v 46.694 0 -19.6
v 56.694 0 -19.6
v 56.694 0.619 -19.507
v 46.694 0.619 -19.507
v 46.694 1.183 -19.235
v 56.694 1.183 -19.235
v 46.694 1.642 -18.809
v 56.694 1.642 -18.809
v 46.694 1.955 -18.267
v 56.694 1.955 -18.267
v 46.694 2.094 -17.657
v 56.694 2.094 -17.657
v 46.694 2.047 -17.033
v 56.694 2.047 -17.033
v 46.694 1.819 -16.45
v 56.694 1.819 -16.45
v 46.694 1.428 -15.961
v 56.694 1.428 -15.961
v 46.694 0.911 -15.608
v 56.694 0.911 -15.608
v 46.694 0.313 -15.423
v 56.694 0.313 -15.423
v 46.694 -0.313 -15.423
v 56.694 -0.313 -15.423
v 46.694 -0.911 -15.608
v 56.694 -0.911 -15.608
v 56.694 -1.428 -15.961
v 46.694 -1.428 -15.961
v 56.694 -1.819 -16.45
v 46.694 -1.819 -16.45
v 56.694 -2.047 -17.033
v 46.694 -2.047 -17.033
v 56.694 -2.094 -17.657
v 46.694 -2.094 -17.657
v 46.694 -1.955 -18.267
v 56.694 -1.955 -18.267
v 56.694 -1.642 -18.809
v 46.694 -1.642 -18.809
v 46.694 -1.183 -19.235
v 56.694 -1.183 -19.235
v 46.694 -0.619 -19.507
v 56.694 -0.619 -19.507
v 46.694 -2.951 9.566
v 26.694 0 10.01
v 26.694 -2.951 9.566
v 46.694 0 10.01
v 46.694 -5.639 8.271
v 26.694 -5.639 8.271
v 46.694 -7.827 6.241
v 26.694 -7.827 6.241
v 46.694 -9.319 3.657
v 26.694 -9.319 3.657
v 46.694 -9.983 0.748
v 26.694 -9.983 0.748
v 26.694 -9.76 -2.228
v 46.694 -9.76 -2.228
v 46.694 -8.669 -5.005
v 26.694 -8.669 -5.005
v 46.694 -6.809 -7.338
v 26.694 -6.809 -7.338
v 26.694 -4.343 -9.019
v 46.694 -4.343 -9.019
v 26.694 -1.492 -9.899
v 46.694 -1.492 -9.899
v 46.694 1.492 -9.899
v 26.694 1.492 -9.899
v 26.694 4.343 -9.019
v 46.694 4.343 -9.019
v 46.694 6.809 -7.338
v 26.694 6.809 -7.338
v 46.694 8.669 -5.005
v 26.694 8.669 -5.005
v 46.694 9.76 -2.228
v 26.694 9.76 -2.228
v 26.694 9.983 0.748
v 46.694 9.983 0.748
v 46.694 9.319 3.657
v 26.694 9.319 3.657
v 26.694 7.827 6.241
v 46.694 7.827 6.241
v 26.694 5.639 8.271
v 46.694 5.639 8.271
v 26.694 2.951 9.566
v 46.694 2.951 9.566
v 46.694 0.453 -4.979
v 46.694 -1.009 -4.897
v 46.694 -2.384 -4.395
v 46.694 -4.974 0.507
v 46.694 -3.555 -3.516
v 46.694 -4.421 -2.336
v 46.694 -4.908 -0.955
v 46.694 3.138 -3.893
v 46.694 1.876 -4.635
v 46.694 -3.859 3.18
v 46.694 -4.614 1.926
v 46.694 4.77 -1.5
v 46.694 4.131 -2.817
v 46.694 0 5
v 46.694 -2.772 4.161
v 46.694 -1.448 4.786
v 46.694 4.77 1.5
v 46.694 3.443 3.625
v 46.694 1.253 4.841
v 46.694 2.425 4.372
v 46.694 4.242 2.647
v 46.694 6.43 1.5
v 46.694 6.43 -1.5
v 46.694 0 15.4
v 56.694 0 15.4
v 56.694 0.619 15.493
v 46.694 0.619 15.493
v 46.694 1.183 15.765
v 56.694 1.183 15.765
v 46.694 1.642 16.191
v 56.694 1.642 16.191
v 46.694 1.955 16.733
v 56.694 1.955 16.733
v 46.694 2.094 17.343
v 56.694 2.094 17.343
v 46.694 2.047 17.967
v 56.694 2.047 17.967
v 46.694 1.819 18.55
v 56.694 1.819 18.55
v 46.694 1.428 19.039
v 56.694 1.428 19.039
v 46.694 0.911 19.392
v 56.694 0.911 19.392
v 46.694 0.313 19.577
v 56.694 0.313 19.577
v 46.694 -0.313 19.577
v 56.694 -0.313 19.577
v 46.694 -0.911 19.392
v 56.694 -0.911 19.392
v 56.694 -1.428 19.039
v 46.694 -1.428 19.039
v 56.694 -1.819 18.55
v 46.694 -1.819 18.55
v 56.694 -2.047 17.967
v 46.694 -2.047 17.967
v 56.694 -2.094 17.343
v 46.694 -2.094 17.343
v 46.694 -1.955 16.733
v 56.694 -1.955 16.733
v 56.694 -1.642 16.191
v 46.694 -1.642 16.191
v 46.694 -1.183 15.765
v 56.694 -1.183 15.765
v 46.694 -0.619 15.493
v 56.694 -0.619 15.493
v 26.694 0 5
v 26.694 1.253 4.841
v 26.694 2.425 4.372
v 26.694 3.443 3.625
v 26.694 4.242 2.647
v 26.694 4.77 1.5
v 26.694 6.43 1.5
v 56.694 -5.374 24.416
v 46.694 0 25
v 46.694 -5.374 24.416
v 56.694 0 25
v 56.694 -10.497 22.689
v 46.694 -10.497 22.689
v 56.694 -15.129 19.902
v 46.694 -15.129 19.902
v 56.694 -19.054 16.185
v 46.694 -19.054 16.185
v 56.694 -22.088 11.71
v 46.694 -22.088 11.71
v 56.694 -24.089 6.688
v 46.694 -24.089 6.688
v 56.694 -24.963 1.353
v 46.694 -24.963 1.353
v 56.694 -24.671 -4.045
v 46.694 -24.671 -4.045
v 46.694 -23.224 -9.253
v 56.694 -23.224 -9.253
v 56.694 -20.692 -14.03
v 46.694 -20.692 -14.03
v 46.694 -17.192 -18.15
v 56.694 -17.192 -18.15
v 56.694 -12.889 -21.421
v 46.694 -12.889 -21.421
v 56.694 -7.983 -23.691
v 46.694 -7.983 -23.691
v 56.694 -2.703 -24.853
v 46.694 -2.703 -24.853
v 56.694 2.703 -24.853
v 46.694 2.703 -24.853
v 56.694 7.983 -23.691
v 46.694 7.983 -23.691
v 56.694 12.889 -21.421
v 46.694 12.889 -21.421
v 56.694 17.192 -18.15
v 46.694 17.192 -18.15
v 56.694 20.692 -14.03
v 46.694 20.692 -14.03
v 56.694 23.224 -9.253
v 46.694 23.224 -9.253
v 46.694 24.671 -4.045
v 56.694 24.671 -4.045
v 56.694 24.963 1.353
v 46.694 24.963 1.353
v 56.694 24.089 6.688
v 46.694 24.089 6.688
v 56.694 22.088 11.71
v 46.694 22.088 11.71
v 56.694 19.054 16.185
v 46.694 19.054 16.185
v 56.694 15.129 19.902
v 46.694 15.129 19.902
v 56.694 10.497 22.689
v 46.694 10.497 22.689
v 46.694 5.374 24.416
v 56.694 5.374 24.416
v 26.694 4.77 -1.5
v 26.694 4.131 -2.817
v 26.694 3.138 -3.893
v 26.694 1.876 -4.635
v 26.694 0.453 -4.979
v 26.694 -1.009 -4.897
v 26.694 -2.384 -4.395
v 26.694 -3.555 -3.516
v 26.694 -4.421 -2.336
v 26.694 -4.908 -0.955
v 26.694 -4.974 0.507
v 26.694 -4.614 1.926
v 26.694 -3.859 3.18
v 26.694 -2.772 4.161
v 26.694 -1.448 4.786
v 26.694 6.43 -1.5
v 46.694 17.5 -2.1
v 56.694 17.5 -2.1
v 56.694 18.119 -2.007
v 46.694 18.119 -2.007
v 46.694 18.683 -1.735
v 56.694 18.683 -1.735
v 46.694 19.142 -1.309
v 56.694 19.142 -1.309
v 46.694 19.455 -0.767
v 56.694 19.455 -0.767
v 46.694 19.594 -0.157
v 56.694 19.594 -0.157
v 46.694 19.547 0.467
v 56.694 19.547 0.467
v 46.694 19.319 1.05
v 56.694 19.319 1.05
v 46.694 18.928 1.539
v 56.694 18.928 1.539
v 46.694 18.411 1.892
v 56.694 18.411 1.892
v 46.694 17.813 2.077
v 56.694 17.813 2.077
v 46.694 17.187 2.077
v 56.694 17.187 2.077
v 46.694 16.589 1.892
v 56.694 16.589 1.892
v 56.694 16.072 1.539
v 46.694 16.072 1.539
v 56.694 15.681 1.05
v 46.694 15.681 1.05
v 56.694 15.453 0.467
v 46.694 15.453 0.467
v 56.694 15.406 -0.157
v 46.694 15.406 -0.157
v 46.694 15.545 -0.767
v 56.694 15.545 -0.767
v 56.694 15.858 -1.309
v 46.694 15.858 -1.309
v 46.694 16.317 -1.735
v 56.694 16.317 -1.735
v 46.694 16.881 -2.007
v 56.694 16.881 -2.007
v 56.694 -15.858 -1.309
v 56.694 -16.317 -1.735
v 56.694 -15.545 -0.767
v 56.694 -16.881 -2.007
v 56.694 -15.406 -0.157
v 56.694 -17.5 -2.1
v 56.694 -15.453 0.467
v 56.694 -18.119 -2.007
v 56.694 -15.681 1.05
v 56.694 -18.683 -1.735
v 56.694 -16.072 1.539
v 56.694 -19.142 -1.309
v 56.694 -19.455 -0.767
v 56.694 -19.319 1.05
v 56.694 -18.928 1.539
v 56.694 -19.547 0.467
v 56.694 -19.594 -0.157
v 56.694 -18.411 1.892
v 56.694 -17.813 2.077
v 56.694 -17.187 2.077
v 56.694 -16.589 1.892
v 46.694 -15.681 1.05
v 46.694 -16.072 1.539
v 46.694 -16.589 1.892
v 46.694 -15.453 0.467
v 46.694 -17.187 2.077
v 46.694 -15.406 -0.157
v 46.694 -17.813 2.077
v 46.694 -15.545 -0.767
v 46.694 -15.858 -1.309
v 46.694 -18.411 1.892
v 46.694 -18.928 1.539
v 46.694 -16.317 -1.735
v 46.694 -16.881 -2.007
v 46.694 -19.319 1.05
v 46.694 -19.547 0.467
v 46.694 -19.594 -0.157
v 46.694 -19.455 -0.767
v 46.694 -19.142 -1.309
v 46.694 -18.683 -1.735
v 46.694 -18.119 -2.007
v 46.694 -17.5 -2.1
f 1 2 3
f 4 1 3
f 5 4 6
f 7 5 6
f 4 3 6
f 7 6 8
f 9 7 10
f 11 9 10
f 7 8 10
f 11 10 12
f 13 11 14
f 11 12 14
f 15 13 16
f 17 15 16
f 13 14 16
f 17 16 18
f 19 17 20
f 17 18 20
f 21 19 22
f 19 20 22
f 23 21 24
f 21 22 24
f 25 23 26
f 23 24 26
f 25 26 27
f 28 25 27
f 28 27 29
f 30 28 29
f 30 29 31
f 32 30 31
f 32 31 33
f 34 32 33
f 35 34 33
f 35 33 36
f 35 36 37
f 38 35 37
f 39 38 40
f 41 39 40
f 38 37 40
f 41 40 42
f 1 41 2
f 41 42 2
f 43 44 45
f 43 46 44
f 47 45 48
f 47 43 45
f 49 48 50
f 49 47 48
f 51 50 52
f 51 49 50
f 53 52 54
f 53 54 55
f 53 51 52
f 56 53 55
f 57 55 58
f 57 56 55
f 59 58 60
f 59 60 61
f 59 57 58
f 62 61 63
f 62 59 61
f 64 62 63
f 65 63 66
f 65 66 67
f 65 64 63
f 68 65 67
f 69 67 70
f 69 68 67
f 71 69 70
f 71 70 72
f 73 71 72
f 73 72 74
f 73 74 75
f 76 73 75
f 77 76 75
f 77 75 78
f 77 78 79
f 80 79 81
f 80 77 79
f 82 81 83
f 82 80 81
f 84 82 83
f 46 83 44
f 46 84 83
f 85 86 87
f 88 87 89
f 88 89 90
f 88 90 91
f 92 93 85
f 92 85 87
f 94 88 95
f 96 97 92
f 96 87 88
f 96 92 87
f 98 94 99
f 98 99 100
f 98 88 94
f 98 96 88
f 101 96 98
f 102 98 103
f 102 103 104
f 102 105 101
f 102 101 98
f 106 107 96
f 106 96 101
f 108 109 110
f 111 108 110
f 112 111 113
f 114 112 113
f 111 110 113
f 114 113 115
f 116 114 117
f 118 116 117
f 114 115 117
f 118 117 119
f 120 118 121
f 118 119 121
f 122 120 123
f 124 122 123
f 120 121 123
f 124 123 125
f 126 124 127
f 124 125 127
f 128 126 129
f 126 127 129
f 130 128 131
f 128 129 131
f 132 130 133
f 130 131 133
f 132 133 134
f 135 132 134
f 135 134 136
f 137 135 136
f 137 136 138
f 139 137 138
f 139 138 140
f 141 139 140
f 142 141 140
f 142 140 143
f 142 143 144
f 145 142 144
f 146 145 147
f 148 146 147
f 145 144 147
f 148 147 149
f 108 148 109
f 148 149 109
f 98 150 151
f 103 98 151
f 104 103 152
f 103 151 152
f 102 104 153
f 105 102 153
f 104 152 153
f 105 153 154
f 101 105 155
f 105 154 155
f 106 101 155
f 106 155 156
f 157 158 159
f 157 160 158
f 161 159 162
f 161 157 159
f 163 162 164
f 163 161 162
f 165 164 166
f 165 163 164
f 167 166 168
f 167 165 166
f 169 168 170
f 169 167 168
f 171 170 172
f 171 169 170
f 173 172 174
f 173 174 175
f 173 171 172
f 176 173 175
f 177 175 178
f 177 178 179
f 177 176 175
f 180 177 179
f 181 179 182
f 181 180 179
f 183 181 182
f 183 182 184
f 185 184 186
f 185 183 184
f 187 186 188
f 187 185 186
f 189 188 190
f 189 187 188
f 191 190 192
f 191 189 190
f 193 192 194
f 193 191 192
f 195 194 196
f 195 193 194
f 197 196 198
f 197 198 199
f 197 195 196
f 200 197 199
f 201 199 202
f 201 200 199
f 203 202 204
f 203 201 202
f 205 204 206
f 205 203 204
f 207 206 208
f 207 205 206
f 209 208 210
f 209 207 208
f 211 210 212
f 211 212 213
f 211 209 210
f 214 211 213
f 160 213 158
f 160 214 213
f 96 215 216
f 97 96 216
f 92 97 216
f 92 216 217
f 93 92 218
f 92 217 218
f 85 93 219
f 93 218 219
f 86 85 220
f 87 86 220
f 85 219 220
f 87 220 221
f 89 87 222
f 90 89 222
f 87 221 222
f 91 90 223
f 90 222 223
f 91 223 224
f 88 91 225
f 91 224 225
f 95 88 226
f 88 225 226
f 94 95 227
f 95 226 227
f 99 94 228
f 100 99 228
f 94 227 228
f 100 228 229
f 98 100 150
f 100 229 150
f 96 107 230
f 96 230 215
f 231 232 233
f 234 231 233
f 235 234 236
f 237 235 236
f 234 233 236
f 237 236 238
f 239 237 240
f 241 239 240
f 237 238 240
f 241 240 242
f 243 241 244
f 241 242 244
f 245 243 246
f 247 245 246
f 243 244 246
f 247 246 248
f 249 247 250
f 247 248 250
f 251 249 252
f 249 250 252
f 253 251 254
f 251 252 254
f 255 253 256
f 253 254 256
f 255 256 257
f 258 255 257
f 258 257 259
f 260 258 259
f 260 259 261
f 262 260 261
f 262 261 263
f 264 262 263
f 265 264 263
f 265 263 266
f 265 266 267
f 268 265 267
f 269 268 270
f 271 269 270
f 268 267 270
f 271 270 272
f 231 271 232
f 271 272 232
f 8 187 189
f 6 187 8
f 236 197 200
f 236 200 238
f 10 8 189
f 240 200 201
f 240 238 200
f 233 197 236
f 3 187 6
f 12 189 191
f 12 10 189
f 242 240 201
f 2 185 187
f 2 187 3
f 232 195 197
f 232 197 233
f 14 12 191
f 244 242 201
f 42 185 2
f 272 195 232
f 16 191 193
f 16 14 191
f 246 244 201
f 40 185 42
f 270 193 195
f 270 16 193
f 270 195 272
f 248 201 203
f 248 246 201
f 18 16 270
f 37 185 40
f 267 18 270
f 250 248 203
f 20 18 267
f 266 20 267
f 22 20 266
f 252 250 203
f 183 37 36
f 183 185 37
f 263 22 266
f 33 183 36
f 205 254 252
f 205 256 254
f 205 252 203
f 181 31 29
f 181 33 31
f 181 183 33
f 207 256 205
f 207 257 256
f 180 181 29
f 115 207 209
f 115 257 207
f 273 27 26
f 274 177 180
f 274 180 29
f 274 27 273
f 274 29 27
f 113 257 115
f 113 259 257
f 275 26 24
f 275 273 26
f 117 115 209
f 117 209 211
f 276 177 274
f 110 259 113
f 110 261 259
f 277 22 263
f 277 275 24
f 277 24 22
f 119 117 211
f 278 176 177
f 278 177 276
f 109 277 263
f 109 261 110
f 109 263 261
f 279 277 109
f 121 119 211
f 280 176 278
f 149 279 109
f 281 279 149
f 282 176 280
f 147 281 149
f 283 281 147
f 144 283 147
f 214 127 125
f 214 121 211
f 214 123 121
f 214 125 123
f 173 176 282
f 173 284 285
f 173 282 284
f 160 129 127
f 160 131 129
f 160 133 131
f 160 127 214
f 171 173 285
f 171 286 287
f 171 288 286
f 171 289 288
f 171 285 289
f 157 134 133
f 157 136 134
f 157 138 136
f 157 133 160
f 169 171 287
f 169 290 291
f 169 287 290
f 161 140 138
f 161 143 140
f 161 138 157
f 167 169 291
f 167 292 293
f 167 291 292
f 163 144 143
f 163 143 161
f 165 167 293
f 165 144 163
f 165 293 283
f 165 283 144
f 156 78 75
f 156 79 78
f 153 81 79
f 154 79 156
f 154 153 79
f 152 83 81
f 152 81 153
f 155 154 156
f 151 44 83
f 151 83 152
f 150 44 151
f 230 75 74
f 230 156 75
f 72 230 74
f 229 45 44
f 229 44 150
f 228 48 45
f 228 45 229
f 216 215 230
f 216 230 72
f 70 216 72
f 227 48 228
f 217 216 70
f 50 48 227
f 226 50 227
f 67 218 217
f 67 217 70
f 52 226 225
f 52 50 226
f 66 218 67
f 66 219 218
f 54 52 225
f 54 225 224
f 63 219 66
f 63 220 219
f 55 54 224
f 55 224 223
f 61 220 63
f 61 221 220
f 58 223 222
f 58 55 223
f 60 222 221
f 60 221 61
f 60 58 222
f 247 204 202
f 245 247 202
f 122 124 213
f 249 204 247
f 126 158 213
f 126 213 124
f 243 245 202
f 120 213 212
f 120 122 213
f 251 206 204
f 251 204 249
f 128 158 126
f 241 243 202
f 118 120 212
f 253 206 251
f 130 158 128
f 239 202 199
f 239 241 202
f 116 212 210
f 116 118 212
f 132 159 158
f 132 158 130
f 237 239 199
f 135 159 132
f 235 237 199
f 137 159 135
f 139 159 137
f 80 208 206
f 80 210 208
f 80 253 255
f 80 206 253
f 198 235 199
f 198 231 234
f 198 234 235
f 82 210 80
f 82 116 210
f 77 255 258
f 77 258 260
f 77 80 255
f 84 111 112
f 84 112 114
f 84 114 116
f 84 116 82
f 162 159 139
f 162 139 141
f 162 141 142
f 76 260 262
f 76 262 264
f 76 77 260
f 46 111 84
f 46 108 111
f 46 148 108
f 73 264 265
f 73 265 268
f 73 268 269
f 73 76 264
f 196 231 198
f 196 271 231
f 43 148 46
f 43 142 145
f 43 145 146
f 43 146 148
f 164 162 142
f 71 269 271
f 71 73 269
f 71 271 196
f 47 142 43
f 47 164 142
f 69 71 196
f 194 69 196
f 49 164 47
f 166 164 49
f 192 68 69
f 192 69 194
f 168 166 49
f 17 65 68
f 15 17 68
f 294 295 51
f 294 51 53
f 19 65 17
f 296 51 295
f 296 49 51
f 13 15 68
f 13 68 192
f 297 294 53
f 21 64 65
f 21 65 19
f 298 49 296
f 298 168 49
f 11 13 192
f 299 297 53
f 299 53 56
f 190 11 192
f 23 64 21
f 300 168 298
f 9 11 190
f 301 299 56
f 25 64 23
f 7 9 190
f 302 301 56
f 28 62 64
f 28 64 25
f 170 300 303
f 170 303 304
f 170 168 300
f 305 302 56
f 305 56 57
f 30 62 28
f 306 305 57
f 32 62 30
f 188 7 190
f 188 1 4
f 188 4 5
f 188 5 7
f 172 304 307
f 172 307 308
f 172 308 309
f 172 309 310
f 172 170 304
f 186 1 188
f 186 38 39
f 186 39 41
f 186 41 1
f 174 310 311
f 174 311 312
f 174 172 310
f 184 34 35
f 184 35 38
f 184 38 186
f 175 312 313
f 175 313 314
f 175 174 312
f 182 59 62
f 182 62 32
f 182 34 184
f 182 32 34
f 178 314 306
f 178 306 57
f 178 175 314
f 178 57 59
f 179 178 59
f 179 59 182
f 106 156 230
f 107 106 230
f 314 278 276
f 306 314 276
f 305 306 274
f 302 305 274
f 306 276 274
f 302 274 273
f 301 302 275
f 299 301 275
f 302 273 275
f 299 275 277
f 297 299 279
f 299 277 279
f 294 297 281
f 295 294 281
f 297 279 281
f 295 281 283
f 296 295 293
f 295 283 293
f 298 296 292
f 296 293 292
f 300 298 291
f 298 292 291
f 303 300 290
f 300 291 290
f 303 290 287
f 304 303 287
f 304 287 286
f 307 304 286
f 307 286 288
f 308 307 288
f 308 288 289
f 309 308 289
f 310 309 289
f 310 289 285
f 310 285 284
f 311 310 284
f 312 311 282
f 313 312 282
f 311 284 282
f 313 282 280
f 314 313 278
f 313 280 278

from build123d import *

# Parameters (mm, degrees)
CUT_EXTRUDE1_DEPTH = 20
SKETCH3_R          = 2.1
CUT_EXTRUDE2_DEPTH = 10


with BuildPart() as part:
    # Sketch1 → Revolve1 (revolve)
    with BuildSketch(Plane(origin=(0, 0, 0), x_dir=(1, 0, 0), z_dir=(0, 1, 0)), mode=Mode.PRIVATE) as revolve1_sk:
        Polygon((26.693713361, 0), (26.693713361, 10.0105), (46.693713361, 10.0105), (46.693713361, 25), (56.693713361, 25), (56.693713361, 0), align=None)
    revolve(revolve1_sk.sketch.rotate(Axis((26.693713361, 0, 0), (1, 0, 0)), 180), axis=Axis((26.693713361, 0, 0), (1, 0, 0)))

    # Sketch2 → Cut-Extrude1 (cut)
    with BuildSketch(Plane.ZY.offset(-26.693713361)):
        with BuildLine():
            ThreePointArc((1.5, 4.769696007), (0, 5), (-1.5, 4.769696007))
            Line((-1.5, 4.769696007), (-1.5, 3.57))
            Line((-1.5, 3.57), (1.5, 3.57))
            Line((1.5, 3.57), (1.5, 4.769696007))
        make_face()
        with BuildLine():
            Line((-1.5, 3.57), (-1.5, 4.769696007))
            ThreePointArc((-1.5, 4.769696007), (-2.958039892, -4.031128874), (5, 0))
            ThreePointArc((5, 0), (4.031128874, 2.958039892), (1.5, 4.769696007))
            Line((1.5, 4.769696007), (1.5, 3.57))
            Line((1.5, 3.57), (-1.5, 3.57))
        make_face()
        with BuildLine():
            Line((1.5, 6.43), (-1.5, 6.43))
            Line((-1.5, 6.43), (-1.5, 4.769696007))
            ThreePointArc((-1.5, 4.769696007), (0, 5), (1.5, 4.769696007))
            Line((1.5, 4.769696007), (1.5, 6.43))
        make_face()
    extrude(amount=-CUT_EXTRUDE1_DEPTH, mode=Mode.SUBTRACT)

    # Sketch3 → Cut-Extrude2 (cut)
    with BuildSketch(Plane(origin=(56.693713361, 0, 0), x_dir=(0, 0, -1), z_dir=(1, 0, 0))):
        with Locations((0, 17.5)):
            Circle(SKETCH3_R)
        with Locations((17.5, 0)):
            Circle(SKETCH3_R)
        with Locations((0, -17.5)):
            Circle(SKETCH3_R)
        with Locations((-17.5, 0)):
            Circle(SKETCH3_R)
    extrude(amount=-CUT_EXTRUDE2_DEPTH, mode=Mode.SUBTRACT)


solid = part.part
